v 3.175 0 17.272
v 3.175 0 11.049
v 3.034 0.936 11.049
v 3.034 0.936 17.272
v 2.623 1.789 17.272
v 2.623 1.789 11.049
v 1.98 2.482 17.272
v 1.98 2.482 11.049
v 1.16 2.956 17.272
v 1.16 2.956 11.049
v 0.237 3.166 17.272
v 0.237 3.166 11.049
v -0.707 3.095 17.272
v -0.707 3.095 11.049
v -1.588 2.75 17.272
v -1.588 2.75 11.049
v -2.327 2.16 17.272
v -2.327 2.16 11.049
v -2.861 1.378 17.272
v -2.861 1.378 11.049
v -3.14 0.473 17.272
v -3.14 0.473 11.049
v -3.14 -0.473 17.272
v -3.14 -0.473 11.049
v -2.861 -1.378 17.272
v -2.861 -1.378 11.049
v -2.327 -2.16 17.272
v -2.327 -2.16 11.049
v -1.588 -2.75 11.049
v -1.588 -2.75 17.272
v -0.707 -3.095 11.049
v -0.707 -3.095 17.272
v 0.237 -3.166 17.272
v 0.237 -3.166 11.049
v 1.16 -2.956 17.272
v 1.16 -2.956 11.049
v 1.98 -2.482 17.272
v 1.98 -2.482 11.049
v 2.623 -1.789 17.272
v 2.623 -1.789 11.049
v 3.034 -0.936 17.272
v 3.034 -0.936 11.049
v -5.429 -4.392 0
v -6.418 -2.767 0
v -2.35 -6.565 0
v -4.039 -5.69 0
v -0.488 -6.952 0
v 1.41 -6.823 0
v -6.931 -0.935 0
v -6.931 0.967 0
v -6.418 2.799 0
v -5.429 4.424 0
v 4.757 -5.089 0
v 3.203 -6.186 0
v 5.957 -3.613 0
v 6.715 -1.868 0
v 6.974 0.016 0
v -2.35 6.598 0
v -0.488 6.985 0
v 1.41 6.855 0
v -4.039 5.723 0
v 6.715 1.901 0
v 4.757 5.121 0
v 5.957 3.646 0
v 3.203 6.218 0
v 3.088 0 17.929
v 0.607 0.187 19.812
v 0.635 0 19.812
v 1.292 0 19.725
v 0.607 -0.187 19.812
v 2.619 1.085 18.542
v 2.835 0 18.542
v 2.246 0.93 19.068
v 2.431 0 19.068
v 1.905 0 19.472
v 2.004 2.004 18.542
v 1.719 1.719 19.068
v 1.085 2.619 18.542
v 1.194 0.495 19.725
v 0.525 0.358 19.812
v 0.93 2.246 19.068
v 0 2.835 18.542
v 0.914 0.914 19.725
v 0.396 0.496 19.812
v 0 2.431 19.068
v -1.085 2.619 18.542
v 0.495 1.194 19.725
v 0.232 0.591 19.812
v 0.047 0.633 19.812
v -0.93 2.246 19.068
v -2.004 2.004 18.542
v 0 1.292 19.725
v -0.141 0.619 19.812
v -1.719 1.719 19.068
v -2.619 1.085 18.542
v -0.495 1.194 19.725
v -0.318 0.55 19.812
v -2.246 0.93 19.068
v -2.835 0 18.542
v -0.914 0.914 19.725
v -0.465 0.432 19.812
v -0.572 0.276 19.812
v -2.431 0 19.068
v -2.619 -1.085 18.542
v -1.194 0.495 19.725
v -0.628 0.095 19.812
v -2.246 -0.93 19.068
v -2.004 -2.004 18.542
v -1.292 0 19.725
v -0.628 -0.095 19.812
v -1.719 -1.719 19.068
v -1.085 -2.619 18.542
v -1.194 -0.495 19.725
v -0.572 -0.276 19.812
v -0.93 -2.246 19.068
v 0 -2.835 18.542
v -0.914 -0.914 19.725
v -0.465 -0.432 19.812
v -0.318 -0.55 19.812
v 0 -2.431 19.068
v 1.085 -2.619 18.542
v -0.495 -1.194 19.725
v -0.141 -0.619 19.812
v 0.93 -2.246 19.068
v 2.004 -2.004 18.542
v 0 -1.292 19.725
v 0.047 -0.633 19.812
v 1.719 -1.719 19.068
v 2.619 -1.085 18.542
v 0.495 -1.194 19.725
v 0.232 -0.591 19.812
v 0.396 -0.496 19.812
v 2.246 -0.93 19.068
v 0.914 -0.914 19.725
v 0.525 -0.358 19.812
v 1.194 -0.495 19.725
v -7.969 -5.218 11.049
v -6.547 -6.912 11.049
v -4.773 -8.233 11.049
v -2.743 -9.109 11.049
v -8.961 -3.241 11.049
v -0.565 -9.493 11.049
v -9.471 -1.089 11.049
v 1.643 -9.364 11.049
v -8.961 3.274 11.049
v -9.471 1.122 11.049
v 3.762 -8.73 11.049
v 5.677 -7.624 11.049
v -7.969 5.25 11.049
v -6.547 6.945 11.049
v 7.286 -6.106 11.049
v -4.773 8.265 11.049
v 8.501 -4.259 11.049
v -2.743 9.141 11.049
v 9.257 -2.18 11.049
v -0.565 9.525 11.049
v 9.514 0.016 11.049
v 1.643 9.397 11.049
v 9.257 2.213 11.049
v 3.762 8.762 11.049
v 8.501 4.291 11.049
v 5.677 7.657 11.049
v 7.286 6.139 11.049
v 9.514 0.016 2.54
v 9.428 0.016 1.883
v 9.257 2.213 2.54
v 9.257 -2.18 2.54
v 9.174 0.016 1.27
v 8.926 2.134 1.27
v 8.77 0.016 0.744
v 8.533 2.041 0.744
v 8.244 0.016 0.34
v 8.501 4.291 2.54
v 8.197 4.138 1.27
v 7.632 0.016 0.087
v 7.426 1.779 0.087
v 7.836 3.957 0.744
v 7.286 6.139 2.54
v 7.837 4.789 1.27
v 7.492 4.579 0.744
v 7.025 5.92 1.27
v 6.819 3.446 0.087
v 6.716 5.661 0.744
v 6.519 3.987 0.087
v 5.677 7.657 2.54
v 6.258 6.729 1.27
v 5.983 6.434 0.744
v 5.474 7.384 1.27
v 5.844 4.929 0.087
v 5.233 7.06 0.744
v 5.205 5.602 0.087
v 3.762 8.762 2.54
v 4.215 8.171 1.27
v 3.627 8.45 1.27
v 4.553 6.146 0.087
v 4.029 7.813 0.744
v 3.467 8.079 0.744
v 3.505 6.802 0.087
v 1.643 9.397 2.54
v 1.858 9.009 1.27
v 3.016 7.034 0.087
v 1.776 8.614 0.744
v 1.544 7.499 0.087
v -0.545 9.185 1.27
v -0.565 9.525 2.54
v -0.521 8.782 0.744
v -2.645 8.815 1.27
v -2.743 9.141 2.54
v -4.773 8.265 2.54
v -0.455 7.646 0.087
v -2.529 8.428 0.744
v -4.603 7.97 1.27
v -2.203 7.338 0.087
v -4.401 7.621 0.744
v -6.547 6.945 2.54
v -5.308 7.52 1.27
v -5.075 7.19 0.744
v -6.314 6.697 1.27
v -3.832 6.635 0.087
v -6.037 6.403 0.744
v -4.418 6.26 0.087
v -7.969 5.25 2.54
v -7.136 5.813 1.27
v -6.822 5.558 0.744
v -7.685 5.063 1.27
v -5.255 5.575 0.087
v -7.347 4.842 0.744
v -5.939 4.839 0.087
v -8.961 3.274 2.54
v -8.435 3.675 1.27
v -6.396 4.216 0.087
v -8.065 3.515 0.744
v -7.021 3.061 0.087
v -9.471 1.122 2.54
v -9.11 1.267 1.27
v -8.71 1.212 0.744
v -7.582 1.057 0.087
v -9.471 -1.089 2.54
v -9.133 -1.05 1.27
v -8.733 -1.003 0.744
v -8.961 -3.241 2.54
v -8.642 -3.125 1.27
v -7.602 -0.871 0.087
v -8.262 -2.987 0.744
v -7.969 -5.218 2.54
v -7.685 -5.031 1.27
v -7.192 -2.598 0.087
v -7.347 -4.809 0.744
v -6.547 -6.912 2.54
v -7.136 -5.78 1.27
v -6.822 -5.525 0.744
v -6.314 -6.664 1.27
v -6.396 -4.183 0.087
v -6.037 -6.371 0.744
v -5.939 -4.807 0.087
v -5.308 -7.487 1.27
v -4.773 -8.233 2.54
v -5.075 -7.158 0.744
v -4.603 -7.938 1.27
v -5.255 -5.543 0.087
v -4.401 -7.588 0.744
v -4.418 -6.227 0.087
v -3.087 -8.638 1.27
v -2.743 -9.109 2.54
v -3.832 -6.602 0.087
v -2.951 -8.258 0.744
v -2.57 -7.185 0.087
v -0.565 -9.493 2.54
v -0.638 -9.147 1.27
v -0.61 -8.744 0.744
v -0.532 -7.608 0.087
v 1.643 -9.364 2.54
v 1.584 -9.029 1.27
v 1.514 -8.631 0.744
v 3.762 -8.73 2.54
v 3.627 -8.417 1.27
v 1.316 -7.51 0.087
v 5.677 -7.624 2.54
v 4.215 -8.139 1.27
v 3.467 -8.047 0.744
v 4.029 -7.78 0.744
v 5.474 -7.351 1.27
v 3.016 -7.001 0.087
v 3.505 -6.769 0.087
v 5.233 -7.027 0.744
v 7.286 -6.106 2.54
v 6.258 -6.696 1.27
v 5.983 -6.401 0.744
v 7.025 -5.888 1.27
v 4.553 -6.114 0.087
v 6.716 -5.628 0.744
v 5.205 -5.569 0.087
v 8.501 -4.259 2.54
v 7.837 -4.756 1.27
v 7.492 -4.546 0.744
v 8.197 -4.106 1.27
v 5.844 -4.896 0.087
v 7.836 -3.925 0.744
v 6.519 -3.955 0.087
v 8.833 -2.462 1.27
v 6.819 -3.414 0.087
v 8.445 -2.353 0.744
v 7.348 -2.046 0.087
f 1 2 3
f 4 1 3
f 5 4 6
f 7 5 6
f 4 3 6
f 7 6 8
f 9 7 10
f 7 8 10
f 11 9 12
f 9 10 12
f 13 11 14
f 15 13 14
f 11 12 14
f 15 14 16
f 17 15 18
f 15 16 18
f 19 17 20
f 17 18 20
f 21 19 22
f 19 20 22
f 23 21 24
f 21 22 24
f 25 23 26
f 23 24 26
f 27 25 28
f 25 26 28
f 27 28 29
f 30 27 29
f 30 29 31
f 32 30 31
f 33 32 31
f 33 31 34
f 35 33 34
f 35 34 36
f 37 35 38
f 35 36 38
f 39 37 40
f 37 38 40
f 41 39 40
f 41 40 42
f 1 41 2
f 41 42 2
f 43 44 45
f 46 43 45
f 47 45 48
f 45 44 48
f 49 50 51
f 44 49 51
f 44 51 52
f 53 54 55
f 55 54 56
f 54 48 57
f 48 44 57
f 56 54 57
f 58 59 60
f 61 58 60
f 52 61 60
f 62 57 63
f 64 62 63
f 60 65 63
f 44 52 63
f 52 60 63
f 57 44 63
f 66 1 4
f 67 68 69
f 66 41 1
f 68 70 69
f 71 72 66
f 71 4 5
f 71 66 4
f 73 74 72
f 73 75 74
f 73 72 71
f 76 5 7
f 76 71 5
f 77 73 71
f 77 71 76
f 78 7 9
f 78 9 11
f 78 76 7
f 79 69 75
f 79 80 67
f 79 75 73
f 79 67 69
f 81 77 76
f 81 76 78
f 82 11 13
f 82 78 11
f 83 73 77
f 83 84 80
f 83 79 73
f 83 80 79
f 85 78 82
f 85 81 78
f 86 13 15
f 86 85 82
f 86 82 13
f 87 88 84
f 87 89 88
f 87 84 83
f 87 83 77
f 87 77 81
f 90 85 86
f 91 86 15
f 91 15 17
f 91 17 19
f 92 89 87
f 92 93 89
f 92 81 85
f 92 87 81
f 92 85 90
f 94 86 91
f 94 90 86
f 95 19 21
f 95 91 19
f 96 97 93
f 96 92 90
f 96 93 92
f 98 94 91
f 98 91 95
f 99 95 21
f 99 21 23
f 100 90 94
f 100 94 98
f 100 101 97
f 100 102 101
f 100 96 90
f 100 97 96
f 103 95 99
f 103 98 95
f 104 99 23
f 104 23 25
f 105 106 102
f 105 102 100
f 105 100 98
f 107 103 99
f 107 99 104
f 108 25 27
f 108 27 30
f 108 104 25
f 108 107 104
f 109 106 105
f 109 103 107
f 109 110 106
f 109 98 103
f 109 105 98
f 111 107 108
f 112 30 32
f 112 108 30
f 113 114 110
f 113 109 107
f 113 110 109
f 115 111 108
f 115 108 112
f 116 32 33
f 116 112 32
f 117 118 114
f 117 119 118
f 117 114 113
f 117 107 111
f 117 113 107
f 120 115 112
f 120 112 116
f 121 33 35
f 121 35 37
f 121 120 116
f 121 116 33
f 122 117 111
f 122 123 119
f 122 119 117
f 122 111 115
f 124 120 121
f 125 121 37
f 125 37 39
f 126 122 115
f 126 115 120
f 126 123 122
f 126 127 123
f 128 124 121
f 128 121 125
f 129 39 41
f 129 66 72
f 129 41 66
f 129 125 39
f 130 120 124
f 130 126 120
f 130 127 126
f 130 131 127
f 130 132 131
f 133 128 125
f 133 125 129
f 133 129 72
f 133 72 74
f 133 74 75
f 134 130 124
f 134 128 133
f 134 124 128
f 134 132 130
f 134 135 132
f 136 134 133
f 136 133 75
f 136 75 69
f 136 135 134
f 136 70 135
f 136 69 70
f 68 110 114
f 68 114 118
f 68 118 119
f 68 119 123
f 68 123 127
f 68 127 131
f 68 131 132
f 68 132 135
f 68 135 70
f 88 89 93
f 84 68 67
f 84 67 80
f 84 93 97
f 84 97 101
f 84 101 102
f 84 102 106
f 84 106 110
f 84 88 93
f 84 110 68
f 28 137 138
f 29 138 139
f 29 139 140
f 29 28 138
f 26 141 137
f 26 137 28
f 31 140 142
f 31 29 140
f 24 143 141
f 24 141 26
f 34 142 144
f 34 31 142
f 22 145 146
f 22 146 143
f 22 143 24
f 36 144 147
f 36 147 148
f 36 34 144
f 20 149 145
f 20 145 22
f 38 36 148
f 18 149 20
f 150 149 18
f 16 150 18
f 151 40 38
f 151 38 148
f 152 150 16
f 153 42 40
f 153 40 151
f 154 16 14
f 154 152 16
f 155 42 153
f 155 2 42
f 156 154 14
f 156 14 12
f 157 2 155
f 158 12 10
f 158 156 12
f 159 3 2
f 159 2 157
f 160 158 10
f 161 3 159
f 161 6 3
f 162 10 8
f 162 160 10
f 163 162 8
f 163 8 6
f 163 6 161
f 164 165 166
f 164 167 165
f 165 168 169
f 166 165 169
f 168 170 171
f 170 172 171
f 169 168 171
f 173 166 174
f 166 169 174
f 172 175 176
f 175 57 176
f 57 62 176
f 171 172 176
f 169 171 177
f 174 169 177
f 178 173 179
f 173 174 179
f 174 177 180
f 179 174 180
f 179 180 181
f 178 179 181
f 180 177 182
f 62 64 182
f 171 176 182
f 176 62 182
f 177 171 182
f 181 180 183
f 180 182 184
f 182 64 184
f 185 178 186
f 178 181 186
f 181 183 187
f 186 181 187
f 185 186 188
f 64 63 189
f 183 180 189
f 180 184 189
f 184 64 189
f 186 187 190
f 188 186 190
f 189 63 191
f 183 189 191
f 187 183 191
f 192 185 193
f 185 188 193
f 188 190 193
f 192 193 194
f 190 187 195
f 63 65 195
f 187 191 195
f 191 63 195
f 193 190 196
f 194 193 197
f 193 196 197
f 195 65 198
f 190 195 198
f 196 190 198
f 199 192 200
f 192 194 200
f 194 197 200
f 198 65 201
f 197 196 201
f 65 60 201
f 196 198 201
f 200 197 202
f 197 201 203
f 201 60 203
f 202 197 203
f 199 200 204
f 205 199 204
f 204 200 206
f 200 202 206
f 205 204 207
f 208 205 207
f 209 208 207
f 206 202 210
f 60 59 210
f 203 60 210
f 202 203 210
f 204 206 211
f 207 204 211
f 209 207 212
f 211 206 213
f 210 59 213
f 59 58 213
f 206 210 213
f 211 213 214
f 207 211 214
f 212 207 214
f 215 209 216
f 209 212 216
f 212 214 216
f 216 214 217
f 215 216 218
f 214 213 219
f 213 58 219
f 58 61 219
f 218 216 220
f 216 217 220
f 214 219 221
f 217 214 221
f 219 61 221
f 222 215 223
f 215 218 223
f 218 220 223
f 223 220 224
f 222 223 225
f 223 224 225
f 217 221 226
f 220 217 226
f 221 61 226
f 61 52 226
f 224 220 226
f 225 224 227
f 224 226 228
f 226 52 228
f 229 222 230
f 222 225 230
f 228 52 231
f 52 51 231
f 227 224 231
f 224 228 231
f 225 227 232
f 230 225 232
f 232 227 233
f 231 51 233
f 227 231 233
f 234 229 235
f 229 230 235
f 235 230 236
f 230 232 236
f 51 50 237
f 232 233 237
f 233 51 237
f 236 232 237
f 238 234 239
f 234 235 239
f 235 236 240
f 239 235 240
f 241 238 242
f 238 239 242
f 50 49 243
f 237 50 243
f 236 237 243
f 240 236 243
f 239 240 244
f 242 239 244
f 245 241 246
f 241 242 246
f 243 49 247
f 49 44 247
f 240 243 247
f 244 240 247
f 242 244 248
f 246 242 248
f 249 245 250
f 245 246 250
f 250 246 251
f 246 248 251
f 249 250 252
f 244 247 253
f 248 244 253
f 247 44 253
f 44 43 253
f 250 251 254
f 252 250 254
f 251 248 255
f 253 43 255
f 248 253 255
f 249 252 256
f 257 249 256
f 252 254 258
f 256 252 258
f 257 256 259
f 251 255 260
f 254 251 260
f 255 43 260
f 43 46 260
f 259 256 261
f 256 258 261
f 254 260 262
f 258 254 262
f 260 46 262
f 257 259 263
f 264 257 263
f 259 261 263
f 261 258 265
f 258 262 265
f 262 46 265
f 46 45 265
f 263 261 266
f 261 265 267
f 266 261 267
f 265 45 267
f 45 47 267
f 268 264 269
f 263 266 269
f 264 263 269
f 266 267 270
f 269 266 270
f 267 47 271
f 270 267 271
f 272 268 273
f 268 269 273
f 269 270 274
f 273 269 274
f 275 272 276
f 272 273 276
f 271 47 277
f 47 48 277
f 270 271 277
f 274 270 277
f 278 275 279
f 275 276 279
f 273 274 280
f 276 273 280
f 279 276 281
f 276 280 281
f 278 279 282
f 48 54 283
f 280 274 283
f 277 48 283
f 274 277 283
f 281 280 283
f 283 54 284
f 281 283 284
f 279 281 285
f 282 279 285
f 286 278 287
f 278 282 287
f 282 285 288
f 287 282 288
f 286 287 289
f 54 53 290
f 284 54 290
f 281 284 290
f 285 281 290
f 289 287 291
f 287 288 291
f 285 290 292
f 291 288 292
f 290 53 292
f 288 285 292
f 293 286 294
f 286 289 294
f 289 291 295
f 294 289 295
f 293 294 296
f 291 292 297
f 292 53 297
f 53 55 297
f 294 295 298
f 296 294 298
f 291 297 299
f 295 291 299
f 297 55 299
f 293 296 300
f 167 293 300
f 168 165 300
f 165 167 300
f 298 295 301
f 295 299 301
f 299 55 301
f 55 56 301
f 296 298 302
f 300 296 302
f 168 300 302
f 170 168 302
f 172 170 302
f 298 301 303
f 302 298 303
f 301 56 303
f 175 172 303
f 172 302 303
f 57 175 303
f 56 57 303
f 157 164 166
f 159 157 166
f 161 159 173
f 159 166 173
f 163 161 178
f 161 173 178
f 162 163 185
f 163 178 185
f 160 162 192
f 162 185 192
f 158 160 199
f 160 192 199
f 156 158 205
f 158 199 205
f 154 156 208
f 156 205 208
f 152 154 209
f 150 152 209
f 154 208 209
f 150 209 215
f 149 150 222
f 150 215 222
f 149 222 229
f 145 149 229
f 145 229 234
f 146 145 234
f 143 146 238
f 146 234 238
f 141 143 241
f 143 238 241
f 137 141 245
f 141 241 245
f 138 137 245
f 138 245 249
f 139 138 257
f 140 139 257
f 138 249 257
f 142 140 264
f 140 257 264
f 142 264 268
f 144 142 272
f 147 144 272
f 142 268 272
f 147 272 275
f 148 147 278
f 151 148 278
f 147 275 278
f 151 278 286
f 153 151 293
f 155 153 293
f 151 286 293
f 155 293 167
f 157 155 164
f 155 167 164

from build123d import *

# Parameters (mm, degrees)
F0_R     = 9.525
F1_DEPTH = 11.049
F2_R     = 2.54
F3_R     = 3.175
F4_DEPTH = 8.763
F5_R     = 2.54


# Not quite as in the source:
# - a feature names something its author has since deleted; it is built from what else it names


with BuildPart() as f1:
    # F0 (on Top) → F1 (new body)
    with BuildSketch(Plane.XY):
        with Locations((-0.0108847216, 0.0162923955)):
            Circle(F0_R)
    extrude(amount=F1_DEPTH)

    # F2
    f2_edges = [f1.edges().sort_by_distance(p)[0] for p in [
        (-9.535885, 0.016292, 0),
    ]]
    fillet(f2_edges, radius=F2_R)

    # F3 (on face) → F4 (join)
    with BuildSketch(Plane.XY.offset(11.049)):
        Circle(F3_R)
    extrude(amount=F4_DEPTH)

    # F5
    f5_edges = [f1.edges().sort_by_distance(p)[0] for p in [
        (-3.175, 0, 19.812),
    ]]
    fillet(f5_edges, radius=F5_R)


solid = f1.part
